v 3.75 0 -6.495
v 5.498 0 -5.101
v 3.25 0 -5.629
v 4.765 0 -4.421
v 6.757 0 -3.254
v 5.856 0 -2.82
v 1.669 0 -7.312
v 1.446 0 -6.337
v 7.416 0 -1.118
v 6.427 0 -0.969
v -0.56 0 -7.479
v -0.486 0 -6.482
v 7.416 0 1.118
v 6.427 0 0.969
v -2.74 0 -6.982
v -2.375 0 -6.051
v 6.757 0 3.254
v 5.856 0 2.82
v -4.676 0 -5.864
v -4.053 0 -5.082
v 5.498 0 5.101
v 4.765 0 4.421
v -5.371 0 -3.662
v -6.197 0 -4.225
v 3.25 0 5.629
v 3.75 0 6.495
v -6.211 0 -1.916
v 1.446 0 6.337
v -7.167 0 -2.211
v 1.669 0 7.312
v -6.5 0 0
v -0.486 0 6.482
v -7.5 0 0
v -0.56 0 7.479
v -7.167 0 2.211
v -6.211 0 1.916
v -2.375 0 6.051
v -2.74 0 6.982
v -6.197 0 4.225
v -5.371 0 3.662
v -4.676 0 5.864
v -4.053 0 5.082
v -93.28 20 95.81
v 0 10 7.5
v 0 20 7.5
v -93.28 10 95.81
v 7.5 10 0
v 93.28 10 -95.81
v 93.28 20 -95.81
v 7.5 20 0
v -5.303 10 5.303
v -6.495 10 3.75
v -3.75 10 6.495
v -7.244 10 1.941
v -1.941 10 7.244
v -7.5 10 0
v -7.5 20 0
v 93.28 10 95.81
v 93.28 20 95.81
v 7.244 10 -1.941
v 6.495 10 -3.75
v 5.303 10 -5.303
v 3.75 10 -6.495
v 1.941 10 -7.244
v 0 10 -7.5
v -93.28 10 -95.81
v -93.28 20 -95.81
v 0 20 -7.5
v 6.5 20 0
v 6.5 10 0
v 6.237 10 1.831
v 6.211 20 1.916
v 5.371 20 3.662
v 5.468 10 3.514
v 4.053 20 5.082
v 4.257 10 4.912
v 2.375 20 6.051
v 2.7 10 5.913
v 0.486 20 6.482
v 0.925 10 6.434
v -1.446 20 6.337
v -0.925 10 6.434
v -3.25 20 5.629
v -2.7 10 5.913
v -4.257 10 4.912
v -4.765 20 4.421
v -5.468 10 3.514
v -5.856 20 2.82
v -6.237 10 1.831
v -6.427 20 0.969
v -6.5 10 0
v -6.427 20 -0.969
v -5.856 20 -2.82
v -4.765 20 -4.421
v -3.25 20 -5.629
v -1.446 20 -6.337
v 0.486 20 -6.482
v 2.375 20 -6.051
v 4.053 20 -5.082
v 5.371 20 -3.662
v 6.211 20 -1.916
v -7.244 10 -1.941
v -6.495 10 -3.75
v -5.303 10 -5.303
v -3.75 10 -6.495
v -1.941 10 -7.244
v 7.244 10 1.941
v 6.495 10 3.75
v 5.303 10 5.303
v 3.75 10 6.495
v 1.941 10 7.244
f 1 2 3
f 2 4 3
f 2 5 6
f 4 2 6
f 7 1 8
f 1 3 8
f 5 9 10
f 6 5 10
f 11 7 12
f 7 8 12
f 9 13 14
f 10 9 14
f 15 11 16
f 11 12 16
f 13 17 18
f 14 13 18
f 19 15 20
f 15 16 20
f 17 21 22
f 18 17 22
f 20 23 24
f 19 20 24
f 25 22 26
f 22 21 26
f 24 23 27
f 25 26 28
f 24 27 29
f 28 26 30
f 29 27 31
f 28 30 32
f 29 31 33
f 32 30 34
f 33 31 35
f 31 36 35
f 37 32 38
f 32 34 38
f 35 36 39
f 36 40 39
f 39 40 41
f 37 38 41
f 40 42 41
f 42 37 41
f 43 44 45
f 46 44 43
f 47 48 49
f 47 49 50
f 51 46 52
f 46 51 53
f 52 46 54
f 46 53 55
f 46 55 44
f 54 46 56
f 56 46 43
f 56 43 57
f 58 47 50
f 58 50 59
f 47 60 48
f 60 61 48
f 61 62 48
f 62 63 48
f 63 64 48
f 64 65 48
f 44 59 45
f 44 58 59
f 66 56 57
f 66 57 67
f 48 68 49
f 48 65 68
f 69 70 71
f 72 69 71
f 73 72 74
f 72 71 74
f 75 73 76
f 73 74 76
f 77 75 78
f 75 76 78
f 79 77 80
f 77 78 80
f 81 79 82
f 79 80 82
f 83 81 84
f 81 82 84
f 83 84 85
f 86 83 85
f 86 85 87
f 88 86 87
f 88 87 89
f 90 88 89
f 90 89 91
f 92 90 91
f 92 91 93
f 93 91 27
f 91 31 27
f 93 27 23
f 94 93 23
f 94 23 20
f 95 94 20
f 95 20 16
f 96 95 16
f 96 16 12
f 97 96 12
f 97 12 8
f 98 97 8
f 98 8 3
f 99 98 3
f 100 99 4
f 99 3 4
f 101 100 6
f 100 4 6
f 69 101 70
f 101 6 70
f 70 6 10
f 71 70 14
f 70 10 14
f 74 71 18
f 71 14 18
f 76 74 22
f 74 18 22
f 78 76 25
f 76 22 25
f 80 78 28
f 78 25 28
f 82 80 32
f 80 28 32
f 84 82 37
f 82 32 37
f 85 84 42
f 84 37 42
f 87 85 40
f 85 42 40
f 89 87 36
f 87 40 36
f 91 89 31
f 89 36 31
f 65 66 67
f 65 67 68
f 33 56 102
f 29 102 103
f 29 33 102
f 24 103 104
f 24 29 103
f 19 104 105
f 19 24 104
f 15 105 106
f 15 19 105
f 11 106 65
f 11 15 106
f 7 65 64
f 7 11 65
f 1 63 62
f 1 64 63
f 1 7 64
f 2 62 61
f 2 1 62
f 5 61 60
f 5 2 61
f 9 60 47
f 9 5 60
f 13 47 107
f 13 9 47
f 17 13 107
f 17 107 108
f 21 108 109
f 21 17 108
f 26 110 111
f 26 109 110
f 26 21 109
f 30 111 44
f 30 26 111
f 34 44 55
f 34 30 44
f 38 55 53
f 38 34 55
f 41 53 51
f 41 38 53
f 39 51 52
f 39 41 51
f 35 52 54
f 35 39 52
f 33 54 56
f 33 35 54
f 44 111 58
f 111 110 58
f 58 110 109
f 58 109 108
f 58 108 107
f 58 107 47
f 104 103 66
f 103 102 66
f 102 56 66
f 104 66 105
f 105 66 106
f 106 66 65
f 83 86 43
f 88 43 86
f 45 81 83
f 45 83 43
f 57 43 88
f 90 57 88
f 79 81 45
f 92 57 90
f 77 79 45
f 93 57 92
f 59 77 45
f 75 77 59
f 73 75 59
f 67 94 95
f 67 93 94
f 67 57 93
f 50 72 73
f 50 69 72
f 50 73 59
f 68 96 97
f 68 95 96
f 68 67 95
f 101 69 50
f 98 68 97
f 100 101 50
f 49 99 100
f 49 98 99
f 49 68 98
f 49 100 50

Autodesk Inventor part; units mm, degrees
ref_plane "YZ Plane" through (0, 0, 0) normal (1, 0, 0) x (0, 1, 0)
ref_plane "XZ Plane" through (0, 0, 0) normal (0, 1, 0) x (-1, 0, 0)
ref_plane "XY Plane" through (0, 0, 0) normal (0, 0, 1) x (1, 0, 0)
sketch "Sketch1" plane through (0, 0, 0) normal (0, 1, 0) x (-1, 0, 0)
  circle A0 centre (0, 0) radius 6.5
  circle A1 centre (0, 0) radius 7.5
  dimension "d0" = 13
  dimension "d1" = 15
extrude "Extrusion1" add sketch "Sketch1" along normal blind 10
sketch "Sketch2" plane through (0, 10, 0) normal (0, 1, 0) x (1, 0, 0)
  line L0 (-93.2796, -95.8103) -> (93.2796, 95.8103) construction
  line L1 (93.2796, -95.8103) -> (-93.2796, 95.8103) construction
  circle A0 centre (0, 0) radius 7.5 projected
  line L2 (-7.5, 0) -> (-93.2796, 95.8103)
  line L3 (-93.2796, 95.8103) -> (0, 7.5)
  line L4 (0, 7.5) -> (93.2796, 95.8103)
  line L5 (93.2796, 95.8103) -> (7.5, 0)
  line L6 (7.5, 0) -> (93.2796, -95.8103)
  line L7 (93.2796, -95.8103) -> (0, -7.5)
  line L8 (0, -7.5) -> (-93.2796, -95.8103)
  line L9 (-93.2796, -95.8103) -> (-7.5, 0)
extrude "Extrusion2" add sketch "Sketch2" along normal blind 10
sketch "Sketch3" plane through (0, 10, 0) normal (0, -1, 0) x (1, 0, 0)
  point P0 (0, 0)
sketch "Sketch4" plane through (0, 20, 0) normal (0, 1, 0) x (1, 0, 0)
  circle A0 centre (0, 0) radius 6.5
extrude "Extrusion3" cut sketch "Sketch4" against normal through all
properties part number "Ventilador Pieza extra de ensamble SEBASTIAN BERMUDEZ"
